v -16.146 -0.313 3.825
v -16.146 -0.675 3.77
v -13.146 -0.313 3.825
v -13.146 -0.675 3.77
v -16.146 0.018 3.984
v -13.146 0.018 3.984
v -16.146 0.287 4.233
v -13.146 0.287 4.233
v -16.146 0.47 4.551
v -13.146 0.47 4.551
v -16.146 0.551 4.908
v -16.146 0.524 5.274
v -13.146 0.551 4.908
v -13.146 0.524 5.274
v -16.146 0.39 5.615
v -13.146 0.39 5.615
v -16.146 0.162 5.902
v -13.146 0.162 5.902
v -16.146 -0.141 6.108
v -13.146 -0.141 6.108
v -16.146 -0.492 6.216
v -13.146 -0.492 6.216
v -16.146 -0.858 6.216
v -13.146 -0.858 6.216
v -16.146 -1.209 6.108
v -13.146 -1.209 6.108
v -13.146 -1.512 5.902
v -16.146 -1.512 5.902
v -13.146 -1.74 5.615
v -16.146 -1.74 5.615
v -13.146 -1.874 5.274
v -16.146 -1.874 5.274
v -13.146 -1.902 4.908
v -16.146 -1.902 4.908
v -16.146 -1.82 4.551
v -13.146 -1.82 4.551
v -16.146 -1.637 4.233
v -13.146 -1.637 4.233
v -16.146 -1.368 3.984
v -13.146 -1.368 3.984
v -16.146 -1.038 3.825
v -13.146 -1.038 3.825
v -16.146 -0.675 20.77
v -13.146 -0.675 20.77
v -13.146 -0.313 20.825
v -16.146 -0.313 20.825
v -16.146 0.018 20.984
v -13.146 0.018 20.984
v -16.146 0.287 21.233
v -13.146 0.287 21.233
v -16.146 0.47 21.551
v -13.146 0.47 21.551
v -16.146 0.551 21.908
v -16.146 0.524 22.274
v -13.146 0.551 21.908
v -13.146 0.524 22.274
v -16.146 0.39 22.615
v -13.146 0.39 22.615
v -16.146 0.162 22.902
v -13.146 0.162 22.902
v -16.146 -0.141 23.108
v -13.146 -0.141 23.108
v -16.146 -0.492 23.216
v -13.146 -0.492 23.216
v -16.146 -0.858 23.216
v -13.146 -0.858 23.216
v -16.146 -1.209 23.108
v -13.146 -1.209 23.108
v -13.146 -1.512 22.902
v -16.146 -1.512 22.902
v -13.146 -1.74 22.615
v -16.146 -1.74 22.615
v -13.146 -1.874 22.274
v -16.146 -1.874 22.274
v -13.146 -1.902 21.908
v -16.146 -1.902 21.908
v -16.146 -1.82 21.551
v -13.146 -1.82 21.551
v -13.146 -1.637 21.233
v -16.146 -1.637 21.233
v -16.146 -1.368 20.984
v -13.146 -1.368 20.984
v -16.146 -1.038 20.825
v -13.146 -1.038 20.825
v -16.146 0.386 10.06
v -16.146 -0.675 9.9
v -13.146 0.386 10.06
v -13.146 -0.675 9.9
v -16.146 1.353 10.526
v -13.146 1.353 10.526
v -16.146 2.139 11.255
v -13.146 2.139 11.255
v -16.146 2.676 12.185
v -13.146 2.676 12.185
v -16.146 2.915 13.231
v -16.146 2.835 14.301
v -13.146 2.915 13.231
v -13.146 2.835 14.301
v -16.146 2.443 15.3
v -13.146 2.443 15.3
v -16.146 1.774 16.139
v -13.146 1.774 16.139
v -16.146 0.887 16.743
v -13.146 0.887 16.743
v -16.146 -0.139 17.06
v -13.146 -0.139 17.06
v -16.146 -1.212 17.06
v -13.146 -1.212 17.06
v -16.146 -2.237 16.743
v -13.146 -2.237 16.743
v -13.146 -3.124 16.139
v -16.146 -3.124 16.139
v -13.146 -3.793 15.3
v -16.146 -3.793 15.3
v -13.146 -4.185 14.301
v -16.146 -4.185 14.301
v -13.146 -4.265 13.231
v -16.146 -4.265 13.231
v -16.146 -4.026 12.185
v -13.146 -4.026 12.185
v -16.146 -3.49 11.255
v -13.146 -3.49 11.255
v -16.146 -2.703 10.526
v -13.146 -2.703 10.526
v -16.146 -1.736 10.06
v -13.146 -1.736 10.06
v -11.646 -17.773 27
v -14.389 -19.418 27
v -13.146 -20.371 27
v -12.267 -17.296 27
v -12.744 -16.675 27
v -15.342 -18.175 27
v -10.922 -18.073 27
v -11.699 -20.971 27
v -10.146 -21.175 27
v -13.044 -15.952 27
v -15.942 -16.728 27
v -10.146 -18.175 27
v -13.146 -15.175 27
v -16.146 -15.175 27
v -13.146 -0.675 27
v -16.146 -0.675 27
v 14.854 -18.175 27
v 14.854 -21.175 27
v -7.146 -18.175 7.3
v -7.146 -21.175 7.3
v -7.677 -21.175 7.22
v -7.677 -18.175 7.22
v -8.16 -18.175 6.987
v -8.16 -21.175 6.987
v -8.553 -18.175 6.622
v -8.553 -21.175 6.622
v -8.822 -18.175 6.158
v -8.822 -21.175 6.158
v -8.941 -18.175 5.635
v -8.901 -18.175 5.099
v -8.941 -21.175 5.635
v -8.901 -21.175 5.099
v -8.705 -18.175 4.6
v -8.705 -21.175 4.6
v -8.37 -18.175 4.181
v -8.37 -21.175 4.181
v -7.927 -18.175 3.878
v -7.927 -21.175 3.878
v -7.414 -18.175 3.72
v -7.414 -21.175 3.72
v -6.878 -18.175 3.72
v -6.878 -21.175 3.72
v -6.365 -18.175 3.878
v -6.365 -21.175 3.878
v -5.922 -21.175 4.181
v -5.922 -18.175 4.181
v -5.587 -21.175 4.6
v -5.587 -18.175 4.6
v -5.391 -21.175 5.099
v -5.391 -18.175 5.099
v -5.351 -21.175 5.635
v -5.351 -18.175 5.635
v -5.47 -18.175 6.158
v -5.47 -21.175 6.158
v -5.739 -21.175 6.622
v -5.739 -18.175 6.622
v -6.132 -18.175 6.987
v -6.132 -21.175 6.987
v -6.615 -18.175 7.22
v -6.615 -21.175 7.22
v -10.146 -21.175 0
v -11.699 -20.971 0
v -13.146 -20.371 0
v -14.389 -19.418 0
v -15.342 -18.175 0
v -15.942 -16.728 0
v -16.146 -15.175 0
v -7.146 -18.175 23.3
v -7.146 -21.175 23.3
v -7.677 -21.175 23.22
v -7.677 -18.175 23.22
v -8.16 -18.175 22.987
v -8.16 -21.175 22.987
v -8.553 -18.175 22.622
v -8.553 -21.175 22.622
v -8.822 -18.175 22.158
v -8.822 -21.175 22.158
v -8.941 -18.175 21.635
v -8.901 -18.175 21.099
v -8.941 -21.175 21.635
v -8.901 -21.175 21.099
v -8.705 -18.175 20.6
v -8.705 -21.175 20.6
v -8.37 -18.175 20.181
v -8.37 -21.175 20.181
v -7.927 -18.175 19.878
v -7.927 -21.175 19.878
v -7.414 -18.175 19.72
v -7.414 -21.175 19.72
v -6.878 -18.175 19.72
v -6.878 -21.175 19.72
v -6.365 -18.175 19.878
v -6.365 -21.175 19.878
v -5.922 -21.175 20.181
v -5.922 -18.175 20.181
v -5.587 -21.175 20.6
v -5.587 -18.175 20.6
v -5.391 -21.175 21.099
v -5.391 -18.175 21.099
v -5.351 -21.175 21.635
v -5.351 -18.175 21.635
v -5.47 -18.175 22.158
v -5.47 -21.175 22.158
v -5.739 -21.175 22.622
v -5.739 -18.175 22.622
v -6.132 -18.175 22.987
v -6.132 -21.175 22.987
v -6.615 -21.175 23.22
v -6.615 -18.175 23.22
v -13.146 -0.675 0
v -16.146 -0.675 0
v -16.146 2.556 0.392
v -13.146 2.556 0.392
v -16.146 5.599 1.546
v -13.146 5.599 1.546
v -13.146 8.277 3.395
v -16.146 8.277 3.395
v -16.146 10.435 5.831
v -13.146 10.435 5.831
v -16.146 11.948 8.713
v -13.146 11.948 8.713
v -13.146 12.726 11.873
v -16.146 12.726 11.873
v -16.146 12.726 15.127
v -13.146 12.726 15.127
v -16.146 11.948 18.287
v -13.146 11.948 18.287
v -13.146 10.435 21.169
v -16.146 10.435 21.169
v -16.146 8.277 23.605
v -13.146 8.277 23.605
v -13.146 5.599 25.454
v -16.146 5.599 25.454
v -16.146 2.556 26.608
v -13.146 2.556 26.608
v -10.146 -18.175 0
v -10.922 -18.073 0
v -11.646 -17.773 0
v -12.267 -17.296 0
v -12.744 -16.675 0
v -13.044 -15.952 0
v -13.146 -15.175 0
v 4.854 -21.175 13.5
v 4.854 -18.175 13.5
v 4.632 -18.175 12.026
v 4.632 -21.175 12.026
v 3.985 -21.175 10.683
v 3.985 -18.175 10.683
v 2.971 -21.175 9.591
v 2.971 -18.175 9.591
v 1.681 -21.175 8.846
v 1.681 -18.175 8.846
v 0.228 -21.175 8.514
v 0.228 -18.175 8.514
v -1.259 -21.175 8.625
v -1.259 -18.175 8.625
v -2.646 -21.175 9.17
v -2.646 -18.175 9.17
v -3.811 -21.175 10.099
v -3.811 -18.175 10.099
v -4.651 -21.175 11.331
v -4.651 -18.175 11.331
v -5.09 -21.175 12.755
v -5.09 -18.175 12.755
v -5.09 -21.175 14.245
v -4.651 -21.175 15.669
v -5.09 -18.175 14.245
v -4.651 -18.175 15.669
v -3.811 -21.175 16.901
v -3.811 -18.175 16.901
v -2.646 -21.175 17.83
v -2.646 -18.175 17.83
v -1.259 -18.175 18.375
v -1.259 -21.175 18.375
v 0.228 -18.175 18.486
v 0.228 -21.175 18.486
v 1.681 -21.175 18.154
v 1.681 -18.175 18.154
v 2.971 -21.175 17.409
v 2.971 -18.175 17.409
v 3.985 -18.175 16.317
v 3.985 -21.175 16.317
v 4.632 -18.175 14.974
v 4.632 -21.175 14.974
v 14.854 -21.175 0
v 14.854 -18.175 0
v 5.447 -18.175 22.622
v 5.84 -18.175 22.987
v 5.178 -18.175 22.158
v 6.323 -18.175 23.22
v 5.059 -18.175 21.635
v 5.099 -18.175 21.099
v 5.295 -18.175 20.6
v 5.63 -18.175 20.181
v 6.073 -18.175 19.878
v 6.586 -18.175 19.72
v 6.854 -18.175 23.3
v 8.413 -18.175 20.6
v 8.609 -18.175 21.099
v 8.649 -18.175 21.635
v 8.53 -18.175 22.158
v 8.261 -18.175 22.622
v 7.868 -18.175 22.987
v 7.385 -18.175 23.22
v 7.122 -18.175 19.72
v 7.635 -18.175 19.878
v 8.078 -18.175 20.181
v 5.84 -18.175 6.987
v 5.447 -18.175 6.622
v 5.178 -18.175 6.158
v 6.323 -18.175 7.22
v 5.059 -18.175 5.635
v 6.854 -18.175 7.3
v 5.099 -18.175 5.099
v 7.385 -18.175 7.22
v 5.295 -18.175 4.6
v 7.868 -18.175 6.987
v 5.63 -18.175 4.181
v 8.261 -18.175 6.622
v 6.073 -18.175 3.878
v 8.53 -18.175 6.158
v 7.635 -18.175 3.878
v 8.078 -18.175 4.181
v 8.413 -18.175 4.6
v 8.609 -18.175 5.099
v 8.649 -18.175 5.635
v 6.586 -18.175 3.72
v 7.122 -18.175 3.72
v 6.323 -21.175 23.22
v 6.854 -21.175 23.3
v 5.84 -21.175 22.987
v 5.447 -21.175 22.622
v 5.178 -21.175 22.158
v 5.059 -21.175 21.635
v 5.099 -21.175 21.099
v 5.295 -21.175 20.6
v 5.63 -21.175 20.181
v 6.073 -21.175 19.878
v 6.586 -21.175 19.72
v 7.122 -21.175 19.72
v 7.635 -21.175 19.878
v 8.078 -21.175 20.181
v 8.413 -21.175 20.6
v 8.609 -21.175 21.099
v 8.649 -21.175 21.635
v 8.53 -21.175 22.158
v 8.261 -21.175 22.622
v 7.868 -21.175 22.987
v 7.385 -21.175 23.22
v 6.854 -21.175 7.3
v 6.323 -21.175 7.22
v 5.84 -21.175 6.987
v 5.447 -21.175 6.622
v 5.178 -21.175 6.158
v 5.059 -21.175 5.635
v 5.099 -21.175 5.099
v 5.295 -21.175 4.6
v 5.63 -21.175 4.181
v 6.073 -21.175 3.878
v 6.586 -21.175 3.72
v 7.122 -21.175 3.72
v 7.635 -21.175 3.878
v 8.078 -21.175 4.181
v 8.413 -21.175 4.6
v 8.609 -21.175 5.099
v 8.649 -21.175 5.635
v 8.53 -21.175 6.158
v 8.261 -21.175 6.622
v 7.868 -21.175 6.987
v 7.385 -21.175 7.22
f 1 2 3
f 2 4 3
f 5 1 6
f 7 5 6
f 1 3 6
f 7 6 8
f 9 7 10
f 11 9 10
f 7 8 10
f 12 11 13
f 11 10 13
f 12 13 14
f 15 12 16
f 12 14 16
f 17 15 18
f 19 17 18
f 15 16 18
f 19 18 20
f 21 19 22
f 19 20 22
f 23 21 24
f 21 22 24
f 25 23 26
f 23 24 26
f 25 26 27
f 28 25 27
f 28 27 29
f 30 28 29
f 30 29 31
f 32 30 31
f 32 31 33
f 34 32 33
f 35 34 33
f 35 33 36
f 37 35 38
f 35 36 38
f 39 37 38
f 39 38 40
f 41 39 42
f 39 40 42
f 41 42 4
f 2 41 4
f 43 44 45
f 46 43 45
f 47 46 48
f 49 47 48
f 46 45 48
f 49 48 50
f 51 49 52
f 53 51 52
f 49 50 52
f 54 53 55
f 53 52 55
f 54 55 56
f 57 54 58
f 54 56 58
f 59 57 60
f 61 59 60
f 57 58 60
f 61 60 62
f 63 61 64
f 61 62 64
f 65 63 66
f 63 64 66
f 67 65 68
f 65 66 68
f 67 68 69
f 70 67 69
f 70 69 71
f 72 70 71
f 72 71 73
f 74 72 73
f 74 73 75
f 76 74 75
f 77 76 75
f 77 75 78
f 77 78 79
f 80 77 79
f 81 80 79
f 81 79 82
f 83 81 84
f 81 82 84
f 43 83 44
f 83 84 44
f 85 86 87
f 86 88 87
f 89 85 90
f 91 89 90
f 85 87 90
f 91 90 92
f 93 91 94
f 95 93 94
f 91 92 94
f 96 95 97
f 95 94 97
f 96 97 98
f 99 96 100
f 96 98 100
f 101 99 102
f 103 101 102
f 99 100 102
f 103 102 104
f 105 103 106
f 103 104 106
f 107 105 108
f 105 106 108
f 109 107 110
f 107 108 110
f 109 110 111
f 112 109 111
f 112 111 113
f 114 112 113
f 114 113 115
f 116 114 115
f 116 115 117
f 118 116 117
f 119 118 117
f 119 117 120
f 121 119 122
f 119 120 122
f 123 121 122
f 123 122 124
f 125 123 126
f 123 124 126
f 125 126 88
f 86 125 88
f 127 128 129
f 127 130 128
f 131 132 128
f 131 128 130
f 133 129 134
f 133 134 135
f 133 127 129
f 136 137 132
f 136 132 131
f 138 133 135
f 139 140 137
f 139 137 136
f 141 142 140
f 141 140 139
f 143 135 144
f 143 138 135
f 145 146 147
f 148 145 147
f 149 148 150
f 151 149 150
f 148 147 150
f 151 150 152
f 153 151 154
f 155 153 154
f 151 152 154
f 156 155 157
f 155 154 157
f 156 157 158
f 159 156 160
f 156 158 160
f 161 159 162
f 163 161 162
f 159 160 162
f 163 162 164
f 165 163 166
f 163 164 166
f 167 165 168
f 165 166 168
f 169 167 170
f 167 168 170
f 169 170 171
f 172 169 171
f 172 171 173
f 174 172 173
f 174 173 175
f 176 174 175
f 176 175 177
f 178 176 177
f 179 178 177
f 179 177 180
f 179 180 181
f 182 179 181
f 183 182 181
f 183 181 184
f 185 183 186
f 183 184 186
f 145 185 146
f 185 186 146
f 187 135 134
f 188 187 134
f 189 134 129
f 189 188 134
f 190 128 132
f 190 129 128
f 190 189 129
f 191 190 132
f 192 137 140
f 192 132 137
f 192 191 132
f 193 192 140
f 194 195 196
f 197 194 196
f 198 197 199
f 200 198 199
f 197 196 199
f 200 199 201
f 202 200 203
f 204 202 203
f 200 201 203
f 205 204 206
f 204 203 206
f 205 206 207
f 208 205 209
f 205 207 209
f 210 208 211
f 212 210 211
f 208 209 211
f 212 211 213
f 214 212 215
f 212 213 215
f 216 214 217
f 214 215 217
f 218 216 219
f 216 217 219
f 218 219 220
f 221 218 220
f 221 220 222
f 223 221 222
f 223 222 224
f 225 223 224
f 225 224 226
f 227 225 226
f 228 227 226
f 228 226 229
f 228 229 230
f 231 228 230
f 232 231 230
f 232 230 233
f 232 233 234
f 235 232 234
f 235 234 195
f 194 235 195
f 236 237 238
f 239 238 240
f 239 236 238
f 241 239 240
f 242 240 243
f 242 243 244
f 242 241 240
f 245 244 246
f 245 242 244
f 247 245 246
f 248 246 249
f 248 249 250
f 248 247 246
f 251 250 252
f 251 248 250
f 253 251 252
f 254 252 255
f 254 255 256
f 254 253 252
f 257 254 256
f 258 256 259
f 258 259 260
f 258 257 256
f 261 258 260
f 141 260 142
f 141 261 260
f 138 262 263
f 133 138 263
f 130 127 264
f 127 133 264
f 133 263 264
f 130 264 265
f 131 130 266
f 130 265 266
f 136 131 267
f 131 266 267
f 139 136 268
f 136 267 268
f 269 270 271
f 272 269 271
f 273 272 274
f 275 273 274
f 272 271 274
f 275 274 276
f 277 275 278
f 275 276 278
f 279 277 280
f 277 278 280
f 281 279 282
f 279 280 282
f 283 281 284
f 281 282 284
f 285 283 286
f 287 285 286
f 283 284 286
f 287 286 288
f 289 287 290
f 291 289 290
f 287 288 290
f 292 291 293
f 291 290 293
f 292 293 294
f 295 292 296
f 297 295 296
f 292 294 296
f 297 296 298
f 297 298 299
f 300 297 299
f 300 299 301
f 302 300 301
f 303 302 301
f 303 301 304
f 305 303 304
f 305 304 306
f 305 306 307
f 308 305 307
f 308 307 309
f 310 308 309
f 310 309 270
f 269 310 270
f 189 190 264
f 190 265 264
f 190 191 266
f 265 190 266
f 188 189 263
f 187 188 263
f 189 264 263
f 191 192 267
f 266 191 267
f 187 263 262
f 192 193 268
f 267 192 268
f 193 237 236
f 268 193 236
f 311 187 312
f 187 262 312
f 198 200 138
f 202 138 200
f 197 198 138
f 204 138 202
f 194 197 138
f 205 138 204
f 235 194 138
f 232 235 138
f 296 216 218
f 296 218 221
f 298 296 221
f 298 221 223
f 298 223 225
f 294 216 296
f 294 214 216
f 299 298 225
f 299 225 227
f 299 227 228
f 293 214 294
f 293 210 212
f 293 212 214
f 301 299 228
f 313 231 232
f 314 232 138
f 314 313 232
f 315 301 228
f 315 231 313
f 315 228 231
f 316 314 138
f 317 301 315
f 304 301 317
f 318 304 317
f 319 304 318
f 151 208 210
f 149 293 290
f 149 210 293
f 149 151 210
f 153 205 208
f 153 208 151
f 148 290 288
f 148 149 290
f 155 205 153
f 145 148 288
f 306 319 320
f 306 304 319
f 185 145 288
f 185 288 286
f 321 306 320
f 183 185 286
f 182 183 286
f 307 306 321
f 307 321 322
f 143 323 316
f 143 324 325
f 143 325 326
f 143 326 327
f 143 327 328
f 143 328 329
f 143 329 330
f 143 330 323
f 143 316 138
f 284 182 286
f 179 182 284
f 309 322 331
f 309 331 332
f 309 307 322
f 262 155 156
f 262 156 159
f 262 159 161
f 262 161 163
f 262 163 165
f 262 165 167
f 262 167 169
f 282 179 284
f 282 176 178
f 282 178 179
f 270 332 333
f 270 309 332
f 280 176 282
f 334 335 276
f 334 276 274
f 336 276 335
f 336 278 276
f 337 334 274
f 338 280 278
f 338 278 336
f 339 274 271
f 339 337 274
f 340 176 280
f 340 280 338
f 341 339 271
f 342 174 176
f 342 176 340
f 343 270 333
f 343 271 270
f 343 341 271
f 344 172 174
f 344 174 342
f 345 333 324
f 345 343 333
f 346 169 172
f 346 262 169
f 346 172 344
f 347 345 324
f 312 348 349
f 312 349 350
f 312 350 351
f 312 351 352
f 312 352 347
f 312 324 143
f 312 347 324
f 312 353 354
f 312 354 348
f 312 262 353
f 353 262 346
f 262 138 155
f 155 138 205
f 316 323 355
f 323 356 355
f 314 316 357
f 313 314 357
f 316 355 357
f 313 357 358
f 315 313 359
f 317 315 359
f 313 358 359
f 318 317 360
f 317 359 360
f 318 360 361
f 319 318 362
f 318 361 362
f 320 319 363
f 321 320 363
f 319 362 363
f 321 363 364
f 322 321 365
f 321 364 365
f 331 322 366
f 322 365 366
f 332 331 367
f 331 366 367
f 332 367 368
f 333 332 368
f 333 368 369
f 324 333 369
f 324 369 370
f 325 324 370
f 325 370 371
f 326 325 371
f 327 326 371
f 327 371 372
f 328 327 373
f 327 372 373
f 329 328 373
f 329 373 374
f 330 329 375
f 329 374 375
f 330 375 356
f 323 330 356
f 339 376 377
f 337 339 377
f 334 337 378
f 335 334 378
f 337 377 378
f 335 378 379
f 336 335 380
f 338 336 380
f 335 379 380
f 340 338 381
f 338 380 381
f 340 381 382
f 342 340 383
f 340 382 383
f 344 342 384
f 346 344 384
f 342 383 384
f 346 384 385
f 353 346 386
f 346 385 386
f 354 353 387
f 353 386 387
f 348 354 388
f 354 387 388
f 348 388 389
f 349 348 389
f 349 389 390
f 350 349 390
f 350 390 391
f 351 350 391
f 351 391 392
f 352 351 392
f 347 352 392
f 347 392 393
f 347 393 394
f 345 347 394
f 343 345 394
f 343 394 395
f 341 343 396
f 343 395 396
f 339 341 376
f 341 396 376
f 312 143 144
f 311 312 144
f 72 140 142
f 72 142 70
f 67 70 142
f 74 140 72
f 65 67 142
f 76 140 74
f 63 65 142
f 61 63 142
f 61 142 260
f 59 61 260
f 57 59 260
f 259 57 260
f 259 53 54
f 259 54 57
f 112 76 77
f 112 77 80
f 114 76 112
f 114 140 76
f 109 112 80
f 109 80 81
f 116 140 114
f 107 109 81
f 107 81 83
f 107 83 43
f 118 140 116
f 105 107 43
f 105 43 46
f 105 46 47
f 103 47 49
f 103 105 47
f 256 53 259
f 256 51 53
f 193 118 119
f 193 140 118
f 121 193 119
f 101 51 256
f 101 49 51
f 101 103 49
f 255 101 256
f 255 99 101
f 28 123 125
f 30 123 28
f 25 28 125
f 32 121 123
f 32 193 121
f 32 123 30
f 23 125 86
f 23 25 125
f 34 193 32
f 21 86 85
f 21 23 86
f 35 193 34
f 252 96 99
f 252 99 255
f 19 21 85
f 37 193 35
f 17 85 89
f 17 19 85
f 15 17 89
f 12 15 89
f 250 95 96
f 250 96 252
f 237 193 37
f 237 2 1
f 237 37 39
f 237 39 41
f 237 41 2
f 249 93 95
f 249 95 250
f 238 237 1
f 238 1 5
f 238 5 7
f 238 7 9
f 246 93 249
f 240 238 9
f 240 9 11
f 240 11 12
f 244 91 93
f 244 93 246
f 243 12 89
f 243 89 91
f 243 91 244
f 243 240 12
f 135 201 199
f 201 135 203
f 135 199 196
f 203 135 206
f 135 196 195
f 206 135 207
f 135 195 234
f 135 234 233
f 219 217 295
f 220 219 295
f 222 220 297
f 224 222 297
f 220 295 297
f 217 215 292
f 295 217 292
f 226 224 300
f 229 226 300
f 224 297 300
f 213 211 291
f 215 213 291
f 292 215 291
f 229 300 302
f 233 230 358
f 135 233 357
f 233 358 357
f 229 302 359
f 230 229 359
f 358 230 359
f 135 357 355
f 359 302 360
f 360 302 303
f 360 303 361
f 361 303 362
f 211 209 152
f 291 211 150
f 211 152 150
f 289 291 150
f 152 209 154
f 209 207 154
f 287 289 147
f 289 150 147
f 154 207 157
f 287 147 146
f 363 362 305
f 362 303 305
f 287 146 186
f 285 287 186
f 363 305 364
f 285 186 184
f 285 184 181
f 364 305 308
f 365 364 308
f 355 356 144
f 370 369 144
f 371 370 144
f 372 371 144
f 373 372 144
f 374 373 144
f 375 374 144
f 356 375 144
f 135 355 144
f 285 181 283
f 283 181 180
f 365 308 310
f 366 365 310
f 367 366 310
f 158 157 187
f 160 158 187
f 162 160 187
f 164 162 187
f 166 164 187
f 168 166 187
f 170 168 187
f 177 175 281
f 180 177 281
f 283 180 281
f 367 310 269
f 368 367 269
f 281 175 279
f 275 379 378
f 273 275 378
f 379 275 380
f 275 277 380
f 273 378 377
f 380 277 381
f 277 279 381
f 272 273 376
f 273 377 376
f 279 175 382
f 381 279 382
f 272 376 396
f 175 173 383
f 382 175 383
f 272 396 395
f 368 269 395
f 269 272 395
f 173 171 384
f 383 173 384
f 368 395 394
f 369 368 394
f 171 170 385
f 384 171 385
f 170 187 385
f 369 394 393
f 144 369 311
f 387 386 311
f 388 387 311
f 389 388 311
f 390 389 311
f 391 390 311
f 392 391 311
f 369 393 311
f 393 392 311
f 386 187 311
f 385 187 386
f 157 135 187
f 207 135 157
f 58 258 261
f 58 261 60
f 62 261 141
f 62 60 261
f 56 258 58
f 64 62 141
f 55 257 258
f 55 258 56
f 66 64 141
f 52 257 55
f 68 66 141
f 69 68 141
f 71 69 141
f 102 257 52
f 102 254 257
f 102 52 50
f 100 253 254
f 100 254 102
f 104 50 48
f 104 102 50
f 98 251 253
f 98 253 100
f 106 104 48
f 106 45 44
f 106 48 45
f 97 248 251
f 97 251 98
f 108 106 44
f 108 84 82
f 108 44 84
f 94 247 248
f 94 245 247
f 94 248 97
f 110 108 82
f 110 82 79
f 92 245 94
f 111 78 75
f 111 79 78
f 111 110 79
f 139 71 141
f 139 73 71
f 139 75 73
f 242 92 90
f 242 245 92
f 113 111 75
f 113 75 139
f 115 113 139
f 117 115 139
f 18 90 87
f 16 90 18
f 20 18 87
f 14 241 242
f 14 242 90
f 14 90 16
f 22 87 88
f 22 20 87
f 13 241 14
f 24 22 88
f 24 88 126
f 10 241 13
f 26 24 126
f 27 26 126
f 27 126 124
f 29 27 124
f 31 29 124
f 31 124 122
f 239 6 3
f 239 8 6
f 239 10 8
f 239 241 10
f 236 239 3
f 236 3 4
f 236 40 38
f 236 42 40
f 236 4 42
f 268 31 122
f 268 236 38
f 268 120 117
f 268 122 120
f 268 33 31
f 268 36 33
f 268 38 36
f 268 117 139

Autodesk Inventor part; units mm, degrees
ref_plane "YZ Plane" through (0, 0, 0) normal (1, 0, 0) x (0, 1, 0)
ref_plane "XZ Plane" through (0, 0, 0) normal (0, 1, 0) x (-1, 0, 0)
ref_plane "XY Plane" through (0, 0, 0) normal (0, 0, 1) x (1, 0, 0)
sketch "草图1" plane through (0, 0, 0) normal (0, 0, 1) x (1, 0, 0)
  line L0 (-16.146, 12.8249) -> (-13.146, 12.8249)
  line L1 (-13.146, 12.8249) -> (-13.146, -15.1751)
  line L2 (-16.146, -15.1751) -> (-16.146, 12.8249)
  arc A0 (-13.146, -15.1751) -> (-10.146, -18.1751) centre (-10.146, -15.1751) ccw
  line L3 (-10.146, -18.1751) -> (-10.146, -15.1751) construction
  arc A1 (-16.146, -15.1751) -> (-10.146, -21.1751) centre (-10.146, -15.1751) ccw
  line L4 (-10.146, -18.1751) -> (14.854, -18.1751)
  line L5 (-10.146, -21.1751) -> (14.854, -21.1751)
  line L6 (14.854, -18.1751) -> (14.854, -21.1751)
  point P0 (0, 0)
  dimension "d0" = 3
  dimension "d1" = 28
  dimension "d2" = 28
  dimension "d3" = 3
  dimension "d4" = 25
  dimension "d5" = 25
extrude "拉伸1" add sketch "草图1" along normal blind 27
sketch "草图2" plane through (-16.146, -15.1751, 0) normal (-1, 0, 0) x (0, 0, 1)
  line L0 (0, 28) -> (0, 0) construction
  line L1 (27, 0) -> (27, -3) construction
  line L2 (0, 28) -> (27, 28) construction
  line L3 (27, 28) -> (27, 0) construction
  line L4 (27, 0) -> (0, 0) construction
  line L5 (0, 0) -> (0, 28) construction
  line L6 (0, 14.5) -> (27, 14.5) construction
  line L7 (27, 0) -> (27, 28) construction
  point P0 (0, 15.1751)
  dimension "d8" = 13.5
sketch "草图3" plane through (-13.146, -15.1751, 0) normal (1, 0, 0) x (0, 0, -1)
  line L0 (-27, 0) -> (-27, 28) construction
  line L1 (0, 0) -> (0, -3) construction
  line L2 (-27, 28) -> (0, 28) construction
  line L3 (0, 28) -> (0, 0) construction
  line L4 (0, 0) -> (-27, 0) construction
  line L5 (-27, 0) -> (-27, 28) construction
  line L6 (-27, 14.5) -> (0, 14.5) construction
  line L7 (0, 28) -> (-27, 28) construction
  arc A0 (0, 14.5) -> (-27, 14.5) centre (-13.5, 14.5) ccw
  line L8 (-27, 14.5) -> (-27, 28)
  line L9 (-13.5, 28) -> (-27, 28)
  line L10 (-13.5, 28) -> (0, 28)
  line L11 (0, 28) -> (0, 0) projected
  line L12 (0, 14.5) -> (0, 28)
  circle A1 centre (-13.5, 14.5) radius 3.6
  circle A2 centre (-5, 14.5) radius 1.23
  line L13 (-13.5, 14.5) -> (-13.5, 0) construction
  circle A3 centre (-22, 14.5) radius 1.23
  point P0 (0, 15.1751)
  dimension "d9" = 13.5
  dimension "d12" = 7.2
  dimension "d13" = 2.46
  dimension "d14" = 17
extrude "拉伸2" cut sketch "草图3" against normal through all contours A0 L8 L9 | A0 L10 L11
extrude "拉伸3" cut sketch "草图3" against normal through all contours A1 | A2 | A3
sketch "草图4" plane through (-10.146, -18.1751, 0) normal (0, 1, 0) x (1, 0, 0)
  point P0 (10.146, 0)
sketch "草图5" plane through (-10.146, -18.1751, 0) normal (0, 1, 0) x (1, 0, 0)
  circle A0 centre (10, -13.5) radius 5
  line L0 (25, 0) -> (0, 0) projected
  line L1 (25, 0) -> (25, -27) projected
  line L2 (10, -13.5) -> (10, -3.684) construction
  line L3 (10, -13.5) -> (-1.3209, -13.5) construction
  point P0 (10.146, 0)
  point P1 (3, -5.5)
  point P2 (3, -21.5)
  point P3 (17, -5.5)
  point P4 (17, -21.5)
  dimension "d17" = 10
  dimension "d18" = 13.5
  dimension "d19" = 15
  dimension "d20" = 16
  dimension "d21" = 14
  dimension "d22" = 7
  dimension "d23" = 7
extrude "拉伸4" cut sketch "草图5" against normal through all
hole "孔1" at (-7.146, -18.1751, 21.5) at (-7.146, -18.1751, 5.5) at (6.854, -18.1751, 5.5) at (6.854, -18.1751, 21.5) direction (0, -1, 0) diameter 3.6 end through all
properties part number "联轴器"
